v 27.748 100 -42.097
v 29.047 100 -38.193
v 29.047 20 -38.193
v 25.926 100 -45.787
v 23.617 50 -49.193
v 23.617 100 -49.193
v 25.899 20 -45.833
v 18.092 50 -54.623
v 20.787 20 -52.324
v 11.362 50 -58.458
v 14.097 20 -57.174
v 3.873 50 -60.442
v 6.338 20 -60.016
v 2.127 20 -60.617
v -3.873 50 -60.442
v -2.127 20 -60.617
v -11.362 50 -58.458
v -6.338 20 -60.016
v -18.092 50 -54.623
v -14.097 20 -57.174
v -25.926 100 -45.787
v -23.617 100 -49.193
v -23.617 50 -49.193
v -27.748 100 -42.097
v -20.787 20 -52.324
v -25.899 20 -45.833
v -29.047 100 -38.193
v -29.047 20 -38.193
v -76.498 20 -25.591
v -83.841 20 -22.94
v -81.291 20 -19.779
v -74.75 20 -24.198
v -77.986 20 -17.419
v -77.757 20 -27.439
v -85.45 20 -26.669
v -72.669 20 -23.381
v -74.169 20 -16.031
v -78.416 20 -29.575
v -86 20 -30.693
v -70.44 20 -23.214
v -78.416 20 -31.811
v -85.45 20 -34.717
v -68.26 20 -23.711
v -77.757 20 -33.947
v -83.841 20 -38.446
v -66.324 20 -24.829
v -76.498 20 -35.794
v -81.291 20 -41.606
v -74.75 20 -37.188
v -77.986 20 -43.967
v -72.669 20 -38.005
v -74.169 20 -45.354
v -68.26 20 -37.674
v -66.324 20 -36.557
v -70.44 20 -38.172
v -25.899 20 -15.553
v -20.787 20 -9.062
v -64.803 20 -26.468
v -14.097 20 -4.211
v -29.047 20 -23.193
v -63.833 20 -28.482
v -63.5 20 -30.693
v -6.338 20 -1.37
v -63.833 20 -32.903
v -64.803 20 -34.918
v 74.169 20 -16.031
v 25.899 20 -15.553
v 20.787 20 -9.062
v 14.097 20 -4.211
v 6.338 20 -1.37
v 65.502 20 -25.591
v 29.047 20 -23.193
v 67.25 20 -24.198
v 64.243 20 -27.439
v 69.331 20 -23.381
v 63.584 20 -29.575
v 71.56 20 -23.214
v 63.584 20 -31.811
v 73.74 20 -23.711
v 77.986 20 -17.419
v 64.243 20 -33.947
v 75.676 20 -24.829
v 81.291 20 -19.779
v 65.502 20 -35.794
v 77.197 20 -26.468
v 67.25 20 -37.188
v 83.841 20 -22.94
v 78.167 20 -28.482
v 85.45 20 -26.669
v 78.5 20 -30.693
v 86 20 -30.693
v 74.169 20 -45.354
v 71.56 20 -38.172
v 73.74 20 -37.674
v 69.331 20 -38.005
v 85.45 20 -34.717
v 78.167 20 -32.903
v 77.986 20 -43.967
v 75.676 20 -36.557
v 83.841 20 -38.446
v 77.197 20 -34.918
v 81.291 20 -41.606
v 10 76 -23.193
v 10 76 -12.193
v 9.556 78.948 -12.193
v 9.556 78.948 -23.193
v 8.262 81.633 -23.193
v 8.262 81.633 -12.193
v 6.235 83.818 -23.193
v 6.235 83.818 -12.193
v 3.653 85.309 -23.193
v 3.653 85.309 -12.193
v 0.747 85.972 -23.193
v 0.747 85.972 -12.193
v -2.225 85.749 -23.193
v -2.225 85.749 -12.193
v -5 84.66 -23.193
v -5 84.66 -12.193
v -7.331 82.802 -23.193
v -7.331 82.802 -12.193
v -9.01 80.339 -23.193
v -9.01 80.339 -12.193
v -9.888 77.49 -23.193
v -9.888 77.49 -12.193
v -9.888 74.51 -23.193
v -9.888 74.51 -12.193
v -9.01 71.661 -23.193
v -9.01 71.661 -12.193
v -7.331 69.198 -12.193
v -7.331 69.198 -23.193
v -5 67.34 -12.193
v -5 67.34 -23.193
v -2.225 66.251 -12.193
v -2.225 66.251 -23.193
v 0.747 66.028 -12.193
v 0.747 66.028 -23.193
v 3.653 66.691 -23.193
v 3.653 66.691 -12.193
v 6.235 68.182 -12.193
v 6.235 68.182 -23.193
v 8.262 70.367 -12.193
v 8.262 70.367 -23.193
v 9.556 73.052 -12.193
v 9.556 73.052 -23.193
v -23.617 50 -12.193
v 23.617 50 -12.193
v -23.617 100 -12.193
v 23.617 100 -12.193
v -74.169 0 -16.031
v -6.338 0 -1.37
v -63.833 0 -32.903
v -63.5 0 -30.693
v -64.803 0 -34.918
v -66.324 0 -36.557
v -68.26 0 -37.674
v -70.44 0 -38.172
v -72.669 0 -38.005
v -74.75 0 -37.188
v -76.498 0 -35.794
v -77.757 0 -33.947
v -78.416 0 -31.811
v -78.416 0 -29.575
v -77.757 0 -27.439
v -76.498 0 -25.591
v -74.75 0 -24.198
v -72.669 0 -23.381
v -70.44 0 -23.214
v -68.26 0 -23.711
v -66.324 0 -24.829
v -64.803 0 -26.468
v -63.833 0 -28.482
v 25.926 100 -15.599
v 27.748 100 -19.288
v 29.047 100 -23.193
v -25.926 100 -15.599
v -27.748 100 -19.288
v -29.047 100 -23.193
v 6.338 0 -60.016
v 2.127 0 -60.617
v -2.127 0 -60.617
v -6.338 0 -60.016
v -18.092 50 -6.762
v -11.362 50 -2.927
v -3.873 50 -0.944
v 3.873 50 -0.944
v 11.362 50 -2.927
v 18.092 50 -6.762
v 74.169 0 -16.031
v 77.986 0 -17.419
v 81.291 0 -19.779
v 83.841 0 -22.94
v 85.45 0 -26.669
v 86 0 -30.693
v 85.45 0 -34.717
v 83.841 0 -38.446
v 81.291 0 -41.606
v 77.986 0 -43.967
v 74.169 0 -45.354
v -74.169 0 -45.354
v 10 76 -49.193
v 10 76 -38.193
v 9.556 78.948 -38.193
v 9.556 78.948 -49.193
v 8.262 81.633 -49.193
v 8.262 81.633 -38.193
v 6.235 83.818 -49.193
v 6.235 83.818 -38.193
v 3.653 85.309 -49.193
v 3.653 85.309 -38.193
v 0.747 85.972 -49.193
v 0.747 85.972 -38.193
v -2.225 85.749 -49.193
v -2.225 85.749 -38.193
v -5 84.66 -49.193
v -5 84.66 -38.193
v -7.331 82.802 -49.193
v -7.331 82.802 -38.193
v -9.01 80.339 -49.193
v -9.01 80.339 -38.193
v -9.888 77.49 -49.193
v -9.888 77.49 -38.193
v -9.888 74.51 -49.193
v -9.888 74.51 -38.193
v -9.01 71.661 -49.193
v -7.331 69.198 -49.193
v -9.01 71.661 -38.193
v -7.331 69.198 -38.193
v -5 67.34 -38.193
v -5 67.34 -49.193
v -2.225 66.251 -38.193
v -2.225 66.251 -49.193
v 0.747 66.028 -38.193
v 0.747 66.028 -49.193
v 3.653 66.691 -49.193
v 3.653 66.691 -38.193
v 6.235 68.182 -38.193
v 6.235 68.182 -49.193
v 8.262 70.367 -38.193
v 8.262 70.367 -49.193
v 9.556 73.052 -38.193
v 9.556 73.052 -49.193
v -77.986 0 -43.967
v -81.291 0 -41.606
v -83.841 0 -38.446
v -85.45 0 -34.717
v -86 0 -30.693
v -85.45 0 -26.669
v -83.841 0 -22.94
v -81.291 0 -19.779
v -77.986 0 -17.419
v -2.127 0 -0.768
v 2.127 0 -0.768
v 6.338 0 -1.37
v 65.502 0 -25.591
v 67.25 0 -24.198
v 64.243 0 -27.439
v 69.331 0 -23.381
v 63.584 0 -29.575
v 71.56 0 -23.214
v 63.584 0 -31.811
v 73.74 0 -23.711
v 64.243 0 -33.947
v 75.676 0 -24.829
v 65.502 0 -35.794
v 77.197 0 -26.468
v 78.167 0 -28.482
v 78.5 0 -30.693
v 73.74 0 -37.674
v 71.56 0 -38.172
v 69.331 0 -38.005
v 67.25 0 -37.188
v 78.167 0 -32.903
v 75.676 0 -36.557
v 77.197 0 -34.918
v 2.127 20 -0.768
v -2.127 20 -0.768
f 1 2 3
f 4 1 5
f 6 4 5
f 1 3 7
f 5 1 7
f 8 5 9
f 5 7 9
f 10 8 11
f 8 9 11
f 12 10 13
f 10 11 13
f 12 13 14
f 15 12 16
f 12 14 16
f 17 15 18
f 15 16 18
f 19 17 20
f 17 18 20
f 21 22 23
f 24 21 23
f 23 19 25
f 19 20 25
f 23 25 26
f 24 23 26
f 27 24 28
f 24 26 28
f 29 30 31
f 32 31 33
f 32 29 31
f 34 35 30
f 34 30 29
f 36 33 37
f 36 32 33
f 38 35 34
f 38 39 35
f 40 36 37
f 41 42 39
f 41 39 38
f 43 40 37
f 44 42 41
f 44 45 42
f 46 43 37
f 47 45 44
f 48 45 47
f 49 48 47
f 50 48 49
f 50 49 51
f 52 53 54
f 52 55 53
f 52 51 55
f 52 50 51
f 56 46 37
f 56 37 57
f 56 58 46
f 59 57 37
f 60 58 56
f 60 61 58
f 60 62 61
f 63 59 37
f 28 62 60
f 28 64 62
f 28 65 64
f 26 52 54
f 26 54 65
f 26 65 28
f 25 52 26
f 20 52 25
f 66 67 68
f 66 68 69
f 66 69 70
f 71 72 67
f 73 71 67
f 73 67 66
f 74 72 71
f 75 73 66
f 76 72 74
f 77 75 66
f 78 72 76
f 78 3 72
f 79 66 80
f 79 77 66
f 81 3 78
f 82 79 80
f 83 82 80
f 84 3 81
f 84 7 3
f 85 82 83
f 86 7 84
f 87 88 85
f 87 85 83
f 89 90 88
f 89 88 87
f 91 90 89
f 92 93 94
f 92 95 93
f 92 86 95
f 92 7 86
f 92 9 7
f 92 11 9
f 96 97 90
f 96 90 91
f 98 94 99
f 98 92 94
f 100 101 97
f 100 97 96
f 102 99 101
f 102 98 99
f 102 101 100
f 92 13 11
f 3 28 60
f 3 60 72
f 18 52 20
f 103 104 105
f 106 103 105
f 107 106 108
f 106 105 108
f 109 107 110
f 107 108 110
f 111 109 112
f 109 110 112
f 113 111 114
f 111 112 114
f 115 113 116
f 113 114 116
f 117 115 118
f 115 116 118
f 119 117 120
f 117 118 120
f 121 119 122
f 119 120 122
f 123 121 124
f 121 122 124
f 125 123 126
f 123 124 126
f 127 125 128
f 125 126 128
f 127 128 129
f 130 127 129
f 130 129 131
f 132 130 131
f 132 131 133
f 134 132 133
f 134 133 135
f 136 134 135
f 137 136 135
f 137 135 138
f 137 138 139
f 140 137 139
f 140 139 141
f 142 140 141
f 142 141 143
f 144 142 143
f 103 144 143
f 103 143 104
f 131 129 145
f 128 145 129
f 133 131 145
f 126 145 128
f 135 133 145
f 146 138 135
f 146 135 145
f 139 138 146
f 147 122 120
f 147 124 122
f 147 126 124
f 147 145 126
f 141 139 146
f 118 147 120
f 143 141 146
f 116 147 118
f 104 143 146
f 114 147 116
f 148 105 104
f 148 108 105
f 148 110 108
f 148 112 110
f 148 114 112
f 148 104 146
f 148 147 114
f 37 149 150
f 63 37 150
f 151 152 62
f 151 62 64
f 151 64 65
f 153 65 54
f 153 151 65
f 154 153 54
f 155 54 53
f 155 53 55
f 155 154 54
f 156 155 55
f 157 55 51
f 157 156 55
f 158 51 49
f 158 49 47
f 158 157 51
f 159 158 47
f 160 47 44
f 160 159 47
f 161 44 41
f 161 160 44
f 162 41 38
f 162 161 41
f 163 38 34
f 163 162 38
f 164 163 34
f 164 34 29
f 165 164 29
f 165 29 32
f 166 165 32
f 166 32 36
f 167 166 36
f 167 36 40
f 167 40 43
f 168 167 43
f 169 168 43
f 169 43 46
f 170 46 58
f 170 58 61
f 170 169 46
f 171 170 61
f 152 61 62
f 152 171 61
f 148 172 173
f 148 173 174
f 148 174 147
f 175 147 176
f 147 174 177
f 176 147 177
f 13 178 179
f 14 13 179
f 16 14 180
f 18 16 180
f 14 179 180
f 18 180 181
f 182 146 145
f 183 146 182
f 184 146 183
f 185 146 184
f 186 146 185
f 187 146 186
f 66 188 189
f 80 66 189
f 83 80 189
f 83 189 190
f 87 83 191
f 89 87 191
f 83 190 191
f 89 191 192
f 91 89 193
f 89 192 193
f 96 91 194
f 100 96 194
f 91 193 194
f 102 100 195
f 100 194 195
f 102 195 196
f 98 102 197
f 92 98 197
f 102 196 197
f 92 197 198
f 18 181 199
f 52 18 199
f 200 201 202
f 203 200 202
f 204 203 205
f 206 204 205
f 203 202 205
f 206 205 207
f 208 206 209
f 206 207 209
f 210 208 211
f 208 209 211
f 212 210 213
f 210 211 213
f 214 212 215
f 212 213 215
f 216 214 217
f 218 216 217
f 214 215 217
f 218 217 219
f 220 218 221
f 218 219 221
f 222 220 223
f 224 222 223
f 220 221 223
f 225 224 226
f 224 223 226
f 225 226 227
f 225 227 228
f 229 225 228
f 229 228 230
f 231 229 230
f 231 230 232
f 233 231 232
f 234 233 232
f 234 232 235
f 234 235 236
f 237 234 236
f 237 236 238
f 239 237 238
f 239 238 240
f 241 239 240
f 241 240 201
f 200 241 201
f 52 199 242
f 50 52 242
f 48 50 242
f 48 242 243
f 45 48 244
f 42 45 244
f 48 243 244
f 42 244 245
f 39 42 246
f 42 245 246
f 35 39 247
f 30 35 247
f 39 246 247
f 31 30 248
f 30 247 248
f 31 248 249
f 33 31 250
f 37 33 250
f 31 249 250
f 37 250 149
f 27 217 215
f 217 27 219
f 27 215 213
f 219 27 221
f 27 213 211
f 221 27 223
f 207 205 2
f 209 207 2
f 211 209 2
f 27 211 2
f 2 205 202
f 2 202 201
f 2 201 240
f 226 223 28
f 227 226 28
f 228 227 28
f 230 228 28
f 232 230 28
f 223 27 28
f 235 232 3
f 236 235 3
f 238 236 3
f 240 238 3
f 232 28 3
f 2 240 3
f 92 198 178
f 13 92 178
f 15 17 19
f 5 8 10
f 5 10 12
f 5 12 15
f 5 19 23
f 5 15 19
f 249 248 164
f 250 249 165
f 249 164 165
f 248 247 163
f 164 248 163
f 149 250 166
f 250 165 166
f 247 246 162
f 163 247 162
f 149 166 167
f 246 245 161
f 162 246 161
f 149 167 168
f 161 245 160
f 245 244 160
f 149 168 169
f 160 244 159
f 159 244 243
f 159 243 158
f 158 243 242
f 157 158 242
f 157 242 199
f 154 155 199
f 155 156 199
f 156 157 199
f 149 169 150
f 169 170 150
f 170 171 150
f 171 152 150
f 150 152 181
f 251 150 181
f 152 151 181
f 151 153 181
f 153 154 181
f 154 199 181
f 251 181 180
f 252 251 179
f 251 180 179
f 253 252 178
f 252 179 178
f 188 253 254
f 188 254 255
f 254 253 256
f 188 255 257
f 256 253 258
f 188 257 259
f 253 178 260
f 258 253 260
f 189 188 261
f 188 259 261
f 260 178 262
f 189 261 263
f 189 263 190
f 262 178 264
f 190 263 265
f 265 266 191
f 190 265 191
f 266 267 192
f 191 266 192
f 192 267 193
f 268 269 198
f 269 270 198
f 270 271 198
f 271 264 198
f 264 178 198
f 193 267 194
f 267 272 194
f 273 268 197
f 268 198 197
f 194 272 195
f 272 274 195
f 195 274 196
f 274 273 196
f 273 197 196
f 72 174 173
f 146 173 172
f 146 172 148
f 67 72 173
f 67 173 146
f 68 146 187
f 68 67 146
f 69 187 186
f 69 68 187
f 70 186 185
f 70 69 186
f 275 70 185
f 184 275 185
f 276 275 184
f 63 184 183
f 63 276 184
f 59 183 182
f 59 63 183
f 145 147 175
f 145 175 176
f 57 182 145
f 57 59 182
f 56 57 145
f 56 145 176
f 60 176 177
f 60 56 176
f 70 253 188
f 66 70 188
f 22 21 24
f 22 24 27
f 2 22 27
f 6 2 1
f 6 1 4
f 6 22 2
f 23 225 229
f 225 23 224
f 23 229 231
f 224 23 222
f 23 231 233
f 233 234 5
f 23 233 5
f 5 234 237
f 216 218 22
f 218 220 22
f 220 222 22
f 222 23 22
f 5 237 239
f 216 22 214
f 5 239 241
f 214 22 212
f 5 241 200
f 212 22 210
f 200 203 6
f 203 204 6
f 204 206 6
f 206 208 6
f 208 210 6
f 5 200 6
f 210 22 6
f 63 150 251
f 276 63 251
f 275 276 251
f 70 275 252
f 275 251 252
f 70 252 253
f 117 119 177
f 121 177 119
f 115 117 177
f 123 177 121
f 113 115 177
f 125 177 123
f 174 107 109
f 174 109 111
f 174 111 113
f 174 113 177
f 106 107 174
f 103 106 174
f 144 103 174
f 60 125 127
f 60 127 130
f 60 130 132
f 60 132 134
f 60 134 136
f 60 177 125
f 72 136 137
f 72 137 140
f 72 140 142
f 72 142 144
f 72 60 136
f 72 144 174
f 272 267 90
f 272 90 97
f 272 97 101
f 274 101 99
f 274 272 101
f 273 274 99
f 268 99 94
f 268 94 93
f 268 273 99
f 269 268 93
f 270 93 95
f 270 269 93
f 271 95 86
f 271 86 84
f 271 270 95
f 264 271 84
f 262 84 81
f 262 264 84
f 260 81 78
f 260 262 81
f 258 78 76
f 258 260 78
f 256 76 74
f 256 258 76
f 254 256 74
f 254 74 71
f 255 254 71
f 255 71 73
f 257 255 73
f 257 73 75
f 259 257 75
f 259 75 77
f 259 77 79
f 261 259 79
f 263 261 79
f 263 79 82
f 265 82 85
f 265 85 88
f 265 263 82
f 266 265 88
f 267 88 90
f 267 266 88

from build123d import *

# Parameters (mm, degrees)
CROQUIS1_R              = 7.5
SALIENTE_EXTRUIR1_DEPTH = 20
SALIENTE_EXTRUIR2_DEPTH = 80
CORTAR_EXTRUIR1_DEPTH   = 50
CROQUIS4_R              = 10
CORTAR_EXTRUIR2_DEPTH   = 37


with BuildPart() as part:
    # Croquis1 → Saliente-Extruir1 (new body)
    with BuildSketch(Plane(origin=(0, 0, 0), x_dir=(1, 0, 0), z_dir=(0, 1, 0))):
        with BuildLine():
            Line((6.338028169, 1.369942014), (74.169014085, 16.031365878))
            ThreePointArc((74.169014085, 16.031365878), (86, 30.692789743), (74.169014085, 45.354213607))
            Line((74.169014085, 45.354213607), (6.338028169, 60.015637472))
            ThreePointArc((6.338028169, 60.015637472), (0, 60.692789743), (-6.338028169, 60.015637472))
            Line((-6.338028169, 60.015637472), (-74.169014085, 45.354213607))
            ThreePointArc((-74.169014085, 45.354213607), (-86, 30.692789743), (-74.169014085, 16.031365878))
            Line((-74.169014085, 16.031365878), (-6.338028169, 1.369942014))
            ThreePointArc((-6.338028169, 1.369942014), (0, 0.692789743), (6.338028169, 1.369942014))
        make_face()
        with Locations((-71, 30.692789743)):
            Circle(CROQUIS1_R, mode=Mode.SUBTRACT)
        with Locations((71, 30.692789743)):
            Circle(CROQUIS1_R, mode=Mode.SUBTRACT)
    extrude(amount=SALIENTE_EXTRUIR1_DEPTH)

    # Croquis2 → Saliente-Extruir2 (add)
    with BuildSketch(Plane(origin=(0, 20, 0), x_dir=(1, 0, 0), z_dir=(0, 1, 0))):
        with BuildLine():
            Line((-29.047375097, 23.192789743), (29.047375097, 23.192789743))
            ThreePointArc((29.047375097, 23.192789743), (0, 0.692789743), (-29.047375097, 23.192789743))
        make_face()
        with BuildLine():
            Line((-29.047375097, 38.192789743), (29.047375097, 38.192789743))
            ThreePointArc((29.047375097, 38.192789743), (0, 60.692789743), (-29.047375097, 38.192789743))
        make_face()
    extrude(amount=SALIENTE_EXTRUIR2_DEPTH)

    # Croquis3 → Cortar-Extruir1 (cut)
    with BuildSketch(Plane(origin=(0, 100, 0), x_dir=(1, 0, 0), z_dir=(0, 1, 0))):
        with BuildLine():
            Line((-23.616731357, 49.192789743), (23.616731357, 49.192789743))
            ThreePointArc((23.616731357, 49.192789743), (0, 60.692789743), (-23.616731357, 49.192789743))
        make_face()
        with BuildLine():
            Line((-23.616731357, 12.192789743), (23.616731357, 12.192789743))
            ThreePointArc((23.616731357, 12.192789743), (0, 0.692789743), (-23.616731357, 12.192789743))
        make_face()
    extrude(amount=-CORTAR_EXTRUIR1_DEPTH, mode=Mode.SUBTRACT)

    # Croquis4 → Cortar-Extruir2 (cut)
    with BuildSketch(Plane.XY.offset(-12.192789743)):
        with Locations((0, 76)):
            Circle(CROQUIS4_R)
    extrude(amount=-CORTAR_EXTRUIR2_DEPTH, mode=Mode.SUBTRACT)


solid = part.part
